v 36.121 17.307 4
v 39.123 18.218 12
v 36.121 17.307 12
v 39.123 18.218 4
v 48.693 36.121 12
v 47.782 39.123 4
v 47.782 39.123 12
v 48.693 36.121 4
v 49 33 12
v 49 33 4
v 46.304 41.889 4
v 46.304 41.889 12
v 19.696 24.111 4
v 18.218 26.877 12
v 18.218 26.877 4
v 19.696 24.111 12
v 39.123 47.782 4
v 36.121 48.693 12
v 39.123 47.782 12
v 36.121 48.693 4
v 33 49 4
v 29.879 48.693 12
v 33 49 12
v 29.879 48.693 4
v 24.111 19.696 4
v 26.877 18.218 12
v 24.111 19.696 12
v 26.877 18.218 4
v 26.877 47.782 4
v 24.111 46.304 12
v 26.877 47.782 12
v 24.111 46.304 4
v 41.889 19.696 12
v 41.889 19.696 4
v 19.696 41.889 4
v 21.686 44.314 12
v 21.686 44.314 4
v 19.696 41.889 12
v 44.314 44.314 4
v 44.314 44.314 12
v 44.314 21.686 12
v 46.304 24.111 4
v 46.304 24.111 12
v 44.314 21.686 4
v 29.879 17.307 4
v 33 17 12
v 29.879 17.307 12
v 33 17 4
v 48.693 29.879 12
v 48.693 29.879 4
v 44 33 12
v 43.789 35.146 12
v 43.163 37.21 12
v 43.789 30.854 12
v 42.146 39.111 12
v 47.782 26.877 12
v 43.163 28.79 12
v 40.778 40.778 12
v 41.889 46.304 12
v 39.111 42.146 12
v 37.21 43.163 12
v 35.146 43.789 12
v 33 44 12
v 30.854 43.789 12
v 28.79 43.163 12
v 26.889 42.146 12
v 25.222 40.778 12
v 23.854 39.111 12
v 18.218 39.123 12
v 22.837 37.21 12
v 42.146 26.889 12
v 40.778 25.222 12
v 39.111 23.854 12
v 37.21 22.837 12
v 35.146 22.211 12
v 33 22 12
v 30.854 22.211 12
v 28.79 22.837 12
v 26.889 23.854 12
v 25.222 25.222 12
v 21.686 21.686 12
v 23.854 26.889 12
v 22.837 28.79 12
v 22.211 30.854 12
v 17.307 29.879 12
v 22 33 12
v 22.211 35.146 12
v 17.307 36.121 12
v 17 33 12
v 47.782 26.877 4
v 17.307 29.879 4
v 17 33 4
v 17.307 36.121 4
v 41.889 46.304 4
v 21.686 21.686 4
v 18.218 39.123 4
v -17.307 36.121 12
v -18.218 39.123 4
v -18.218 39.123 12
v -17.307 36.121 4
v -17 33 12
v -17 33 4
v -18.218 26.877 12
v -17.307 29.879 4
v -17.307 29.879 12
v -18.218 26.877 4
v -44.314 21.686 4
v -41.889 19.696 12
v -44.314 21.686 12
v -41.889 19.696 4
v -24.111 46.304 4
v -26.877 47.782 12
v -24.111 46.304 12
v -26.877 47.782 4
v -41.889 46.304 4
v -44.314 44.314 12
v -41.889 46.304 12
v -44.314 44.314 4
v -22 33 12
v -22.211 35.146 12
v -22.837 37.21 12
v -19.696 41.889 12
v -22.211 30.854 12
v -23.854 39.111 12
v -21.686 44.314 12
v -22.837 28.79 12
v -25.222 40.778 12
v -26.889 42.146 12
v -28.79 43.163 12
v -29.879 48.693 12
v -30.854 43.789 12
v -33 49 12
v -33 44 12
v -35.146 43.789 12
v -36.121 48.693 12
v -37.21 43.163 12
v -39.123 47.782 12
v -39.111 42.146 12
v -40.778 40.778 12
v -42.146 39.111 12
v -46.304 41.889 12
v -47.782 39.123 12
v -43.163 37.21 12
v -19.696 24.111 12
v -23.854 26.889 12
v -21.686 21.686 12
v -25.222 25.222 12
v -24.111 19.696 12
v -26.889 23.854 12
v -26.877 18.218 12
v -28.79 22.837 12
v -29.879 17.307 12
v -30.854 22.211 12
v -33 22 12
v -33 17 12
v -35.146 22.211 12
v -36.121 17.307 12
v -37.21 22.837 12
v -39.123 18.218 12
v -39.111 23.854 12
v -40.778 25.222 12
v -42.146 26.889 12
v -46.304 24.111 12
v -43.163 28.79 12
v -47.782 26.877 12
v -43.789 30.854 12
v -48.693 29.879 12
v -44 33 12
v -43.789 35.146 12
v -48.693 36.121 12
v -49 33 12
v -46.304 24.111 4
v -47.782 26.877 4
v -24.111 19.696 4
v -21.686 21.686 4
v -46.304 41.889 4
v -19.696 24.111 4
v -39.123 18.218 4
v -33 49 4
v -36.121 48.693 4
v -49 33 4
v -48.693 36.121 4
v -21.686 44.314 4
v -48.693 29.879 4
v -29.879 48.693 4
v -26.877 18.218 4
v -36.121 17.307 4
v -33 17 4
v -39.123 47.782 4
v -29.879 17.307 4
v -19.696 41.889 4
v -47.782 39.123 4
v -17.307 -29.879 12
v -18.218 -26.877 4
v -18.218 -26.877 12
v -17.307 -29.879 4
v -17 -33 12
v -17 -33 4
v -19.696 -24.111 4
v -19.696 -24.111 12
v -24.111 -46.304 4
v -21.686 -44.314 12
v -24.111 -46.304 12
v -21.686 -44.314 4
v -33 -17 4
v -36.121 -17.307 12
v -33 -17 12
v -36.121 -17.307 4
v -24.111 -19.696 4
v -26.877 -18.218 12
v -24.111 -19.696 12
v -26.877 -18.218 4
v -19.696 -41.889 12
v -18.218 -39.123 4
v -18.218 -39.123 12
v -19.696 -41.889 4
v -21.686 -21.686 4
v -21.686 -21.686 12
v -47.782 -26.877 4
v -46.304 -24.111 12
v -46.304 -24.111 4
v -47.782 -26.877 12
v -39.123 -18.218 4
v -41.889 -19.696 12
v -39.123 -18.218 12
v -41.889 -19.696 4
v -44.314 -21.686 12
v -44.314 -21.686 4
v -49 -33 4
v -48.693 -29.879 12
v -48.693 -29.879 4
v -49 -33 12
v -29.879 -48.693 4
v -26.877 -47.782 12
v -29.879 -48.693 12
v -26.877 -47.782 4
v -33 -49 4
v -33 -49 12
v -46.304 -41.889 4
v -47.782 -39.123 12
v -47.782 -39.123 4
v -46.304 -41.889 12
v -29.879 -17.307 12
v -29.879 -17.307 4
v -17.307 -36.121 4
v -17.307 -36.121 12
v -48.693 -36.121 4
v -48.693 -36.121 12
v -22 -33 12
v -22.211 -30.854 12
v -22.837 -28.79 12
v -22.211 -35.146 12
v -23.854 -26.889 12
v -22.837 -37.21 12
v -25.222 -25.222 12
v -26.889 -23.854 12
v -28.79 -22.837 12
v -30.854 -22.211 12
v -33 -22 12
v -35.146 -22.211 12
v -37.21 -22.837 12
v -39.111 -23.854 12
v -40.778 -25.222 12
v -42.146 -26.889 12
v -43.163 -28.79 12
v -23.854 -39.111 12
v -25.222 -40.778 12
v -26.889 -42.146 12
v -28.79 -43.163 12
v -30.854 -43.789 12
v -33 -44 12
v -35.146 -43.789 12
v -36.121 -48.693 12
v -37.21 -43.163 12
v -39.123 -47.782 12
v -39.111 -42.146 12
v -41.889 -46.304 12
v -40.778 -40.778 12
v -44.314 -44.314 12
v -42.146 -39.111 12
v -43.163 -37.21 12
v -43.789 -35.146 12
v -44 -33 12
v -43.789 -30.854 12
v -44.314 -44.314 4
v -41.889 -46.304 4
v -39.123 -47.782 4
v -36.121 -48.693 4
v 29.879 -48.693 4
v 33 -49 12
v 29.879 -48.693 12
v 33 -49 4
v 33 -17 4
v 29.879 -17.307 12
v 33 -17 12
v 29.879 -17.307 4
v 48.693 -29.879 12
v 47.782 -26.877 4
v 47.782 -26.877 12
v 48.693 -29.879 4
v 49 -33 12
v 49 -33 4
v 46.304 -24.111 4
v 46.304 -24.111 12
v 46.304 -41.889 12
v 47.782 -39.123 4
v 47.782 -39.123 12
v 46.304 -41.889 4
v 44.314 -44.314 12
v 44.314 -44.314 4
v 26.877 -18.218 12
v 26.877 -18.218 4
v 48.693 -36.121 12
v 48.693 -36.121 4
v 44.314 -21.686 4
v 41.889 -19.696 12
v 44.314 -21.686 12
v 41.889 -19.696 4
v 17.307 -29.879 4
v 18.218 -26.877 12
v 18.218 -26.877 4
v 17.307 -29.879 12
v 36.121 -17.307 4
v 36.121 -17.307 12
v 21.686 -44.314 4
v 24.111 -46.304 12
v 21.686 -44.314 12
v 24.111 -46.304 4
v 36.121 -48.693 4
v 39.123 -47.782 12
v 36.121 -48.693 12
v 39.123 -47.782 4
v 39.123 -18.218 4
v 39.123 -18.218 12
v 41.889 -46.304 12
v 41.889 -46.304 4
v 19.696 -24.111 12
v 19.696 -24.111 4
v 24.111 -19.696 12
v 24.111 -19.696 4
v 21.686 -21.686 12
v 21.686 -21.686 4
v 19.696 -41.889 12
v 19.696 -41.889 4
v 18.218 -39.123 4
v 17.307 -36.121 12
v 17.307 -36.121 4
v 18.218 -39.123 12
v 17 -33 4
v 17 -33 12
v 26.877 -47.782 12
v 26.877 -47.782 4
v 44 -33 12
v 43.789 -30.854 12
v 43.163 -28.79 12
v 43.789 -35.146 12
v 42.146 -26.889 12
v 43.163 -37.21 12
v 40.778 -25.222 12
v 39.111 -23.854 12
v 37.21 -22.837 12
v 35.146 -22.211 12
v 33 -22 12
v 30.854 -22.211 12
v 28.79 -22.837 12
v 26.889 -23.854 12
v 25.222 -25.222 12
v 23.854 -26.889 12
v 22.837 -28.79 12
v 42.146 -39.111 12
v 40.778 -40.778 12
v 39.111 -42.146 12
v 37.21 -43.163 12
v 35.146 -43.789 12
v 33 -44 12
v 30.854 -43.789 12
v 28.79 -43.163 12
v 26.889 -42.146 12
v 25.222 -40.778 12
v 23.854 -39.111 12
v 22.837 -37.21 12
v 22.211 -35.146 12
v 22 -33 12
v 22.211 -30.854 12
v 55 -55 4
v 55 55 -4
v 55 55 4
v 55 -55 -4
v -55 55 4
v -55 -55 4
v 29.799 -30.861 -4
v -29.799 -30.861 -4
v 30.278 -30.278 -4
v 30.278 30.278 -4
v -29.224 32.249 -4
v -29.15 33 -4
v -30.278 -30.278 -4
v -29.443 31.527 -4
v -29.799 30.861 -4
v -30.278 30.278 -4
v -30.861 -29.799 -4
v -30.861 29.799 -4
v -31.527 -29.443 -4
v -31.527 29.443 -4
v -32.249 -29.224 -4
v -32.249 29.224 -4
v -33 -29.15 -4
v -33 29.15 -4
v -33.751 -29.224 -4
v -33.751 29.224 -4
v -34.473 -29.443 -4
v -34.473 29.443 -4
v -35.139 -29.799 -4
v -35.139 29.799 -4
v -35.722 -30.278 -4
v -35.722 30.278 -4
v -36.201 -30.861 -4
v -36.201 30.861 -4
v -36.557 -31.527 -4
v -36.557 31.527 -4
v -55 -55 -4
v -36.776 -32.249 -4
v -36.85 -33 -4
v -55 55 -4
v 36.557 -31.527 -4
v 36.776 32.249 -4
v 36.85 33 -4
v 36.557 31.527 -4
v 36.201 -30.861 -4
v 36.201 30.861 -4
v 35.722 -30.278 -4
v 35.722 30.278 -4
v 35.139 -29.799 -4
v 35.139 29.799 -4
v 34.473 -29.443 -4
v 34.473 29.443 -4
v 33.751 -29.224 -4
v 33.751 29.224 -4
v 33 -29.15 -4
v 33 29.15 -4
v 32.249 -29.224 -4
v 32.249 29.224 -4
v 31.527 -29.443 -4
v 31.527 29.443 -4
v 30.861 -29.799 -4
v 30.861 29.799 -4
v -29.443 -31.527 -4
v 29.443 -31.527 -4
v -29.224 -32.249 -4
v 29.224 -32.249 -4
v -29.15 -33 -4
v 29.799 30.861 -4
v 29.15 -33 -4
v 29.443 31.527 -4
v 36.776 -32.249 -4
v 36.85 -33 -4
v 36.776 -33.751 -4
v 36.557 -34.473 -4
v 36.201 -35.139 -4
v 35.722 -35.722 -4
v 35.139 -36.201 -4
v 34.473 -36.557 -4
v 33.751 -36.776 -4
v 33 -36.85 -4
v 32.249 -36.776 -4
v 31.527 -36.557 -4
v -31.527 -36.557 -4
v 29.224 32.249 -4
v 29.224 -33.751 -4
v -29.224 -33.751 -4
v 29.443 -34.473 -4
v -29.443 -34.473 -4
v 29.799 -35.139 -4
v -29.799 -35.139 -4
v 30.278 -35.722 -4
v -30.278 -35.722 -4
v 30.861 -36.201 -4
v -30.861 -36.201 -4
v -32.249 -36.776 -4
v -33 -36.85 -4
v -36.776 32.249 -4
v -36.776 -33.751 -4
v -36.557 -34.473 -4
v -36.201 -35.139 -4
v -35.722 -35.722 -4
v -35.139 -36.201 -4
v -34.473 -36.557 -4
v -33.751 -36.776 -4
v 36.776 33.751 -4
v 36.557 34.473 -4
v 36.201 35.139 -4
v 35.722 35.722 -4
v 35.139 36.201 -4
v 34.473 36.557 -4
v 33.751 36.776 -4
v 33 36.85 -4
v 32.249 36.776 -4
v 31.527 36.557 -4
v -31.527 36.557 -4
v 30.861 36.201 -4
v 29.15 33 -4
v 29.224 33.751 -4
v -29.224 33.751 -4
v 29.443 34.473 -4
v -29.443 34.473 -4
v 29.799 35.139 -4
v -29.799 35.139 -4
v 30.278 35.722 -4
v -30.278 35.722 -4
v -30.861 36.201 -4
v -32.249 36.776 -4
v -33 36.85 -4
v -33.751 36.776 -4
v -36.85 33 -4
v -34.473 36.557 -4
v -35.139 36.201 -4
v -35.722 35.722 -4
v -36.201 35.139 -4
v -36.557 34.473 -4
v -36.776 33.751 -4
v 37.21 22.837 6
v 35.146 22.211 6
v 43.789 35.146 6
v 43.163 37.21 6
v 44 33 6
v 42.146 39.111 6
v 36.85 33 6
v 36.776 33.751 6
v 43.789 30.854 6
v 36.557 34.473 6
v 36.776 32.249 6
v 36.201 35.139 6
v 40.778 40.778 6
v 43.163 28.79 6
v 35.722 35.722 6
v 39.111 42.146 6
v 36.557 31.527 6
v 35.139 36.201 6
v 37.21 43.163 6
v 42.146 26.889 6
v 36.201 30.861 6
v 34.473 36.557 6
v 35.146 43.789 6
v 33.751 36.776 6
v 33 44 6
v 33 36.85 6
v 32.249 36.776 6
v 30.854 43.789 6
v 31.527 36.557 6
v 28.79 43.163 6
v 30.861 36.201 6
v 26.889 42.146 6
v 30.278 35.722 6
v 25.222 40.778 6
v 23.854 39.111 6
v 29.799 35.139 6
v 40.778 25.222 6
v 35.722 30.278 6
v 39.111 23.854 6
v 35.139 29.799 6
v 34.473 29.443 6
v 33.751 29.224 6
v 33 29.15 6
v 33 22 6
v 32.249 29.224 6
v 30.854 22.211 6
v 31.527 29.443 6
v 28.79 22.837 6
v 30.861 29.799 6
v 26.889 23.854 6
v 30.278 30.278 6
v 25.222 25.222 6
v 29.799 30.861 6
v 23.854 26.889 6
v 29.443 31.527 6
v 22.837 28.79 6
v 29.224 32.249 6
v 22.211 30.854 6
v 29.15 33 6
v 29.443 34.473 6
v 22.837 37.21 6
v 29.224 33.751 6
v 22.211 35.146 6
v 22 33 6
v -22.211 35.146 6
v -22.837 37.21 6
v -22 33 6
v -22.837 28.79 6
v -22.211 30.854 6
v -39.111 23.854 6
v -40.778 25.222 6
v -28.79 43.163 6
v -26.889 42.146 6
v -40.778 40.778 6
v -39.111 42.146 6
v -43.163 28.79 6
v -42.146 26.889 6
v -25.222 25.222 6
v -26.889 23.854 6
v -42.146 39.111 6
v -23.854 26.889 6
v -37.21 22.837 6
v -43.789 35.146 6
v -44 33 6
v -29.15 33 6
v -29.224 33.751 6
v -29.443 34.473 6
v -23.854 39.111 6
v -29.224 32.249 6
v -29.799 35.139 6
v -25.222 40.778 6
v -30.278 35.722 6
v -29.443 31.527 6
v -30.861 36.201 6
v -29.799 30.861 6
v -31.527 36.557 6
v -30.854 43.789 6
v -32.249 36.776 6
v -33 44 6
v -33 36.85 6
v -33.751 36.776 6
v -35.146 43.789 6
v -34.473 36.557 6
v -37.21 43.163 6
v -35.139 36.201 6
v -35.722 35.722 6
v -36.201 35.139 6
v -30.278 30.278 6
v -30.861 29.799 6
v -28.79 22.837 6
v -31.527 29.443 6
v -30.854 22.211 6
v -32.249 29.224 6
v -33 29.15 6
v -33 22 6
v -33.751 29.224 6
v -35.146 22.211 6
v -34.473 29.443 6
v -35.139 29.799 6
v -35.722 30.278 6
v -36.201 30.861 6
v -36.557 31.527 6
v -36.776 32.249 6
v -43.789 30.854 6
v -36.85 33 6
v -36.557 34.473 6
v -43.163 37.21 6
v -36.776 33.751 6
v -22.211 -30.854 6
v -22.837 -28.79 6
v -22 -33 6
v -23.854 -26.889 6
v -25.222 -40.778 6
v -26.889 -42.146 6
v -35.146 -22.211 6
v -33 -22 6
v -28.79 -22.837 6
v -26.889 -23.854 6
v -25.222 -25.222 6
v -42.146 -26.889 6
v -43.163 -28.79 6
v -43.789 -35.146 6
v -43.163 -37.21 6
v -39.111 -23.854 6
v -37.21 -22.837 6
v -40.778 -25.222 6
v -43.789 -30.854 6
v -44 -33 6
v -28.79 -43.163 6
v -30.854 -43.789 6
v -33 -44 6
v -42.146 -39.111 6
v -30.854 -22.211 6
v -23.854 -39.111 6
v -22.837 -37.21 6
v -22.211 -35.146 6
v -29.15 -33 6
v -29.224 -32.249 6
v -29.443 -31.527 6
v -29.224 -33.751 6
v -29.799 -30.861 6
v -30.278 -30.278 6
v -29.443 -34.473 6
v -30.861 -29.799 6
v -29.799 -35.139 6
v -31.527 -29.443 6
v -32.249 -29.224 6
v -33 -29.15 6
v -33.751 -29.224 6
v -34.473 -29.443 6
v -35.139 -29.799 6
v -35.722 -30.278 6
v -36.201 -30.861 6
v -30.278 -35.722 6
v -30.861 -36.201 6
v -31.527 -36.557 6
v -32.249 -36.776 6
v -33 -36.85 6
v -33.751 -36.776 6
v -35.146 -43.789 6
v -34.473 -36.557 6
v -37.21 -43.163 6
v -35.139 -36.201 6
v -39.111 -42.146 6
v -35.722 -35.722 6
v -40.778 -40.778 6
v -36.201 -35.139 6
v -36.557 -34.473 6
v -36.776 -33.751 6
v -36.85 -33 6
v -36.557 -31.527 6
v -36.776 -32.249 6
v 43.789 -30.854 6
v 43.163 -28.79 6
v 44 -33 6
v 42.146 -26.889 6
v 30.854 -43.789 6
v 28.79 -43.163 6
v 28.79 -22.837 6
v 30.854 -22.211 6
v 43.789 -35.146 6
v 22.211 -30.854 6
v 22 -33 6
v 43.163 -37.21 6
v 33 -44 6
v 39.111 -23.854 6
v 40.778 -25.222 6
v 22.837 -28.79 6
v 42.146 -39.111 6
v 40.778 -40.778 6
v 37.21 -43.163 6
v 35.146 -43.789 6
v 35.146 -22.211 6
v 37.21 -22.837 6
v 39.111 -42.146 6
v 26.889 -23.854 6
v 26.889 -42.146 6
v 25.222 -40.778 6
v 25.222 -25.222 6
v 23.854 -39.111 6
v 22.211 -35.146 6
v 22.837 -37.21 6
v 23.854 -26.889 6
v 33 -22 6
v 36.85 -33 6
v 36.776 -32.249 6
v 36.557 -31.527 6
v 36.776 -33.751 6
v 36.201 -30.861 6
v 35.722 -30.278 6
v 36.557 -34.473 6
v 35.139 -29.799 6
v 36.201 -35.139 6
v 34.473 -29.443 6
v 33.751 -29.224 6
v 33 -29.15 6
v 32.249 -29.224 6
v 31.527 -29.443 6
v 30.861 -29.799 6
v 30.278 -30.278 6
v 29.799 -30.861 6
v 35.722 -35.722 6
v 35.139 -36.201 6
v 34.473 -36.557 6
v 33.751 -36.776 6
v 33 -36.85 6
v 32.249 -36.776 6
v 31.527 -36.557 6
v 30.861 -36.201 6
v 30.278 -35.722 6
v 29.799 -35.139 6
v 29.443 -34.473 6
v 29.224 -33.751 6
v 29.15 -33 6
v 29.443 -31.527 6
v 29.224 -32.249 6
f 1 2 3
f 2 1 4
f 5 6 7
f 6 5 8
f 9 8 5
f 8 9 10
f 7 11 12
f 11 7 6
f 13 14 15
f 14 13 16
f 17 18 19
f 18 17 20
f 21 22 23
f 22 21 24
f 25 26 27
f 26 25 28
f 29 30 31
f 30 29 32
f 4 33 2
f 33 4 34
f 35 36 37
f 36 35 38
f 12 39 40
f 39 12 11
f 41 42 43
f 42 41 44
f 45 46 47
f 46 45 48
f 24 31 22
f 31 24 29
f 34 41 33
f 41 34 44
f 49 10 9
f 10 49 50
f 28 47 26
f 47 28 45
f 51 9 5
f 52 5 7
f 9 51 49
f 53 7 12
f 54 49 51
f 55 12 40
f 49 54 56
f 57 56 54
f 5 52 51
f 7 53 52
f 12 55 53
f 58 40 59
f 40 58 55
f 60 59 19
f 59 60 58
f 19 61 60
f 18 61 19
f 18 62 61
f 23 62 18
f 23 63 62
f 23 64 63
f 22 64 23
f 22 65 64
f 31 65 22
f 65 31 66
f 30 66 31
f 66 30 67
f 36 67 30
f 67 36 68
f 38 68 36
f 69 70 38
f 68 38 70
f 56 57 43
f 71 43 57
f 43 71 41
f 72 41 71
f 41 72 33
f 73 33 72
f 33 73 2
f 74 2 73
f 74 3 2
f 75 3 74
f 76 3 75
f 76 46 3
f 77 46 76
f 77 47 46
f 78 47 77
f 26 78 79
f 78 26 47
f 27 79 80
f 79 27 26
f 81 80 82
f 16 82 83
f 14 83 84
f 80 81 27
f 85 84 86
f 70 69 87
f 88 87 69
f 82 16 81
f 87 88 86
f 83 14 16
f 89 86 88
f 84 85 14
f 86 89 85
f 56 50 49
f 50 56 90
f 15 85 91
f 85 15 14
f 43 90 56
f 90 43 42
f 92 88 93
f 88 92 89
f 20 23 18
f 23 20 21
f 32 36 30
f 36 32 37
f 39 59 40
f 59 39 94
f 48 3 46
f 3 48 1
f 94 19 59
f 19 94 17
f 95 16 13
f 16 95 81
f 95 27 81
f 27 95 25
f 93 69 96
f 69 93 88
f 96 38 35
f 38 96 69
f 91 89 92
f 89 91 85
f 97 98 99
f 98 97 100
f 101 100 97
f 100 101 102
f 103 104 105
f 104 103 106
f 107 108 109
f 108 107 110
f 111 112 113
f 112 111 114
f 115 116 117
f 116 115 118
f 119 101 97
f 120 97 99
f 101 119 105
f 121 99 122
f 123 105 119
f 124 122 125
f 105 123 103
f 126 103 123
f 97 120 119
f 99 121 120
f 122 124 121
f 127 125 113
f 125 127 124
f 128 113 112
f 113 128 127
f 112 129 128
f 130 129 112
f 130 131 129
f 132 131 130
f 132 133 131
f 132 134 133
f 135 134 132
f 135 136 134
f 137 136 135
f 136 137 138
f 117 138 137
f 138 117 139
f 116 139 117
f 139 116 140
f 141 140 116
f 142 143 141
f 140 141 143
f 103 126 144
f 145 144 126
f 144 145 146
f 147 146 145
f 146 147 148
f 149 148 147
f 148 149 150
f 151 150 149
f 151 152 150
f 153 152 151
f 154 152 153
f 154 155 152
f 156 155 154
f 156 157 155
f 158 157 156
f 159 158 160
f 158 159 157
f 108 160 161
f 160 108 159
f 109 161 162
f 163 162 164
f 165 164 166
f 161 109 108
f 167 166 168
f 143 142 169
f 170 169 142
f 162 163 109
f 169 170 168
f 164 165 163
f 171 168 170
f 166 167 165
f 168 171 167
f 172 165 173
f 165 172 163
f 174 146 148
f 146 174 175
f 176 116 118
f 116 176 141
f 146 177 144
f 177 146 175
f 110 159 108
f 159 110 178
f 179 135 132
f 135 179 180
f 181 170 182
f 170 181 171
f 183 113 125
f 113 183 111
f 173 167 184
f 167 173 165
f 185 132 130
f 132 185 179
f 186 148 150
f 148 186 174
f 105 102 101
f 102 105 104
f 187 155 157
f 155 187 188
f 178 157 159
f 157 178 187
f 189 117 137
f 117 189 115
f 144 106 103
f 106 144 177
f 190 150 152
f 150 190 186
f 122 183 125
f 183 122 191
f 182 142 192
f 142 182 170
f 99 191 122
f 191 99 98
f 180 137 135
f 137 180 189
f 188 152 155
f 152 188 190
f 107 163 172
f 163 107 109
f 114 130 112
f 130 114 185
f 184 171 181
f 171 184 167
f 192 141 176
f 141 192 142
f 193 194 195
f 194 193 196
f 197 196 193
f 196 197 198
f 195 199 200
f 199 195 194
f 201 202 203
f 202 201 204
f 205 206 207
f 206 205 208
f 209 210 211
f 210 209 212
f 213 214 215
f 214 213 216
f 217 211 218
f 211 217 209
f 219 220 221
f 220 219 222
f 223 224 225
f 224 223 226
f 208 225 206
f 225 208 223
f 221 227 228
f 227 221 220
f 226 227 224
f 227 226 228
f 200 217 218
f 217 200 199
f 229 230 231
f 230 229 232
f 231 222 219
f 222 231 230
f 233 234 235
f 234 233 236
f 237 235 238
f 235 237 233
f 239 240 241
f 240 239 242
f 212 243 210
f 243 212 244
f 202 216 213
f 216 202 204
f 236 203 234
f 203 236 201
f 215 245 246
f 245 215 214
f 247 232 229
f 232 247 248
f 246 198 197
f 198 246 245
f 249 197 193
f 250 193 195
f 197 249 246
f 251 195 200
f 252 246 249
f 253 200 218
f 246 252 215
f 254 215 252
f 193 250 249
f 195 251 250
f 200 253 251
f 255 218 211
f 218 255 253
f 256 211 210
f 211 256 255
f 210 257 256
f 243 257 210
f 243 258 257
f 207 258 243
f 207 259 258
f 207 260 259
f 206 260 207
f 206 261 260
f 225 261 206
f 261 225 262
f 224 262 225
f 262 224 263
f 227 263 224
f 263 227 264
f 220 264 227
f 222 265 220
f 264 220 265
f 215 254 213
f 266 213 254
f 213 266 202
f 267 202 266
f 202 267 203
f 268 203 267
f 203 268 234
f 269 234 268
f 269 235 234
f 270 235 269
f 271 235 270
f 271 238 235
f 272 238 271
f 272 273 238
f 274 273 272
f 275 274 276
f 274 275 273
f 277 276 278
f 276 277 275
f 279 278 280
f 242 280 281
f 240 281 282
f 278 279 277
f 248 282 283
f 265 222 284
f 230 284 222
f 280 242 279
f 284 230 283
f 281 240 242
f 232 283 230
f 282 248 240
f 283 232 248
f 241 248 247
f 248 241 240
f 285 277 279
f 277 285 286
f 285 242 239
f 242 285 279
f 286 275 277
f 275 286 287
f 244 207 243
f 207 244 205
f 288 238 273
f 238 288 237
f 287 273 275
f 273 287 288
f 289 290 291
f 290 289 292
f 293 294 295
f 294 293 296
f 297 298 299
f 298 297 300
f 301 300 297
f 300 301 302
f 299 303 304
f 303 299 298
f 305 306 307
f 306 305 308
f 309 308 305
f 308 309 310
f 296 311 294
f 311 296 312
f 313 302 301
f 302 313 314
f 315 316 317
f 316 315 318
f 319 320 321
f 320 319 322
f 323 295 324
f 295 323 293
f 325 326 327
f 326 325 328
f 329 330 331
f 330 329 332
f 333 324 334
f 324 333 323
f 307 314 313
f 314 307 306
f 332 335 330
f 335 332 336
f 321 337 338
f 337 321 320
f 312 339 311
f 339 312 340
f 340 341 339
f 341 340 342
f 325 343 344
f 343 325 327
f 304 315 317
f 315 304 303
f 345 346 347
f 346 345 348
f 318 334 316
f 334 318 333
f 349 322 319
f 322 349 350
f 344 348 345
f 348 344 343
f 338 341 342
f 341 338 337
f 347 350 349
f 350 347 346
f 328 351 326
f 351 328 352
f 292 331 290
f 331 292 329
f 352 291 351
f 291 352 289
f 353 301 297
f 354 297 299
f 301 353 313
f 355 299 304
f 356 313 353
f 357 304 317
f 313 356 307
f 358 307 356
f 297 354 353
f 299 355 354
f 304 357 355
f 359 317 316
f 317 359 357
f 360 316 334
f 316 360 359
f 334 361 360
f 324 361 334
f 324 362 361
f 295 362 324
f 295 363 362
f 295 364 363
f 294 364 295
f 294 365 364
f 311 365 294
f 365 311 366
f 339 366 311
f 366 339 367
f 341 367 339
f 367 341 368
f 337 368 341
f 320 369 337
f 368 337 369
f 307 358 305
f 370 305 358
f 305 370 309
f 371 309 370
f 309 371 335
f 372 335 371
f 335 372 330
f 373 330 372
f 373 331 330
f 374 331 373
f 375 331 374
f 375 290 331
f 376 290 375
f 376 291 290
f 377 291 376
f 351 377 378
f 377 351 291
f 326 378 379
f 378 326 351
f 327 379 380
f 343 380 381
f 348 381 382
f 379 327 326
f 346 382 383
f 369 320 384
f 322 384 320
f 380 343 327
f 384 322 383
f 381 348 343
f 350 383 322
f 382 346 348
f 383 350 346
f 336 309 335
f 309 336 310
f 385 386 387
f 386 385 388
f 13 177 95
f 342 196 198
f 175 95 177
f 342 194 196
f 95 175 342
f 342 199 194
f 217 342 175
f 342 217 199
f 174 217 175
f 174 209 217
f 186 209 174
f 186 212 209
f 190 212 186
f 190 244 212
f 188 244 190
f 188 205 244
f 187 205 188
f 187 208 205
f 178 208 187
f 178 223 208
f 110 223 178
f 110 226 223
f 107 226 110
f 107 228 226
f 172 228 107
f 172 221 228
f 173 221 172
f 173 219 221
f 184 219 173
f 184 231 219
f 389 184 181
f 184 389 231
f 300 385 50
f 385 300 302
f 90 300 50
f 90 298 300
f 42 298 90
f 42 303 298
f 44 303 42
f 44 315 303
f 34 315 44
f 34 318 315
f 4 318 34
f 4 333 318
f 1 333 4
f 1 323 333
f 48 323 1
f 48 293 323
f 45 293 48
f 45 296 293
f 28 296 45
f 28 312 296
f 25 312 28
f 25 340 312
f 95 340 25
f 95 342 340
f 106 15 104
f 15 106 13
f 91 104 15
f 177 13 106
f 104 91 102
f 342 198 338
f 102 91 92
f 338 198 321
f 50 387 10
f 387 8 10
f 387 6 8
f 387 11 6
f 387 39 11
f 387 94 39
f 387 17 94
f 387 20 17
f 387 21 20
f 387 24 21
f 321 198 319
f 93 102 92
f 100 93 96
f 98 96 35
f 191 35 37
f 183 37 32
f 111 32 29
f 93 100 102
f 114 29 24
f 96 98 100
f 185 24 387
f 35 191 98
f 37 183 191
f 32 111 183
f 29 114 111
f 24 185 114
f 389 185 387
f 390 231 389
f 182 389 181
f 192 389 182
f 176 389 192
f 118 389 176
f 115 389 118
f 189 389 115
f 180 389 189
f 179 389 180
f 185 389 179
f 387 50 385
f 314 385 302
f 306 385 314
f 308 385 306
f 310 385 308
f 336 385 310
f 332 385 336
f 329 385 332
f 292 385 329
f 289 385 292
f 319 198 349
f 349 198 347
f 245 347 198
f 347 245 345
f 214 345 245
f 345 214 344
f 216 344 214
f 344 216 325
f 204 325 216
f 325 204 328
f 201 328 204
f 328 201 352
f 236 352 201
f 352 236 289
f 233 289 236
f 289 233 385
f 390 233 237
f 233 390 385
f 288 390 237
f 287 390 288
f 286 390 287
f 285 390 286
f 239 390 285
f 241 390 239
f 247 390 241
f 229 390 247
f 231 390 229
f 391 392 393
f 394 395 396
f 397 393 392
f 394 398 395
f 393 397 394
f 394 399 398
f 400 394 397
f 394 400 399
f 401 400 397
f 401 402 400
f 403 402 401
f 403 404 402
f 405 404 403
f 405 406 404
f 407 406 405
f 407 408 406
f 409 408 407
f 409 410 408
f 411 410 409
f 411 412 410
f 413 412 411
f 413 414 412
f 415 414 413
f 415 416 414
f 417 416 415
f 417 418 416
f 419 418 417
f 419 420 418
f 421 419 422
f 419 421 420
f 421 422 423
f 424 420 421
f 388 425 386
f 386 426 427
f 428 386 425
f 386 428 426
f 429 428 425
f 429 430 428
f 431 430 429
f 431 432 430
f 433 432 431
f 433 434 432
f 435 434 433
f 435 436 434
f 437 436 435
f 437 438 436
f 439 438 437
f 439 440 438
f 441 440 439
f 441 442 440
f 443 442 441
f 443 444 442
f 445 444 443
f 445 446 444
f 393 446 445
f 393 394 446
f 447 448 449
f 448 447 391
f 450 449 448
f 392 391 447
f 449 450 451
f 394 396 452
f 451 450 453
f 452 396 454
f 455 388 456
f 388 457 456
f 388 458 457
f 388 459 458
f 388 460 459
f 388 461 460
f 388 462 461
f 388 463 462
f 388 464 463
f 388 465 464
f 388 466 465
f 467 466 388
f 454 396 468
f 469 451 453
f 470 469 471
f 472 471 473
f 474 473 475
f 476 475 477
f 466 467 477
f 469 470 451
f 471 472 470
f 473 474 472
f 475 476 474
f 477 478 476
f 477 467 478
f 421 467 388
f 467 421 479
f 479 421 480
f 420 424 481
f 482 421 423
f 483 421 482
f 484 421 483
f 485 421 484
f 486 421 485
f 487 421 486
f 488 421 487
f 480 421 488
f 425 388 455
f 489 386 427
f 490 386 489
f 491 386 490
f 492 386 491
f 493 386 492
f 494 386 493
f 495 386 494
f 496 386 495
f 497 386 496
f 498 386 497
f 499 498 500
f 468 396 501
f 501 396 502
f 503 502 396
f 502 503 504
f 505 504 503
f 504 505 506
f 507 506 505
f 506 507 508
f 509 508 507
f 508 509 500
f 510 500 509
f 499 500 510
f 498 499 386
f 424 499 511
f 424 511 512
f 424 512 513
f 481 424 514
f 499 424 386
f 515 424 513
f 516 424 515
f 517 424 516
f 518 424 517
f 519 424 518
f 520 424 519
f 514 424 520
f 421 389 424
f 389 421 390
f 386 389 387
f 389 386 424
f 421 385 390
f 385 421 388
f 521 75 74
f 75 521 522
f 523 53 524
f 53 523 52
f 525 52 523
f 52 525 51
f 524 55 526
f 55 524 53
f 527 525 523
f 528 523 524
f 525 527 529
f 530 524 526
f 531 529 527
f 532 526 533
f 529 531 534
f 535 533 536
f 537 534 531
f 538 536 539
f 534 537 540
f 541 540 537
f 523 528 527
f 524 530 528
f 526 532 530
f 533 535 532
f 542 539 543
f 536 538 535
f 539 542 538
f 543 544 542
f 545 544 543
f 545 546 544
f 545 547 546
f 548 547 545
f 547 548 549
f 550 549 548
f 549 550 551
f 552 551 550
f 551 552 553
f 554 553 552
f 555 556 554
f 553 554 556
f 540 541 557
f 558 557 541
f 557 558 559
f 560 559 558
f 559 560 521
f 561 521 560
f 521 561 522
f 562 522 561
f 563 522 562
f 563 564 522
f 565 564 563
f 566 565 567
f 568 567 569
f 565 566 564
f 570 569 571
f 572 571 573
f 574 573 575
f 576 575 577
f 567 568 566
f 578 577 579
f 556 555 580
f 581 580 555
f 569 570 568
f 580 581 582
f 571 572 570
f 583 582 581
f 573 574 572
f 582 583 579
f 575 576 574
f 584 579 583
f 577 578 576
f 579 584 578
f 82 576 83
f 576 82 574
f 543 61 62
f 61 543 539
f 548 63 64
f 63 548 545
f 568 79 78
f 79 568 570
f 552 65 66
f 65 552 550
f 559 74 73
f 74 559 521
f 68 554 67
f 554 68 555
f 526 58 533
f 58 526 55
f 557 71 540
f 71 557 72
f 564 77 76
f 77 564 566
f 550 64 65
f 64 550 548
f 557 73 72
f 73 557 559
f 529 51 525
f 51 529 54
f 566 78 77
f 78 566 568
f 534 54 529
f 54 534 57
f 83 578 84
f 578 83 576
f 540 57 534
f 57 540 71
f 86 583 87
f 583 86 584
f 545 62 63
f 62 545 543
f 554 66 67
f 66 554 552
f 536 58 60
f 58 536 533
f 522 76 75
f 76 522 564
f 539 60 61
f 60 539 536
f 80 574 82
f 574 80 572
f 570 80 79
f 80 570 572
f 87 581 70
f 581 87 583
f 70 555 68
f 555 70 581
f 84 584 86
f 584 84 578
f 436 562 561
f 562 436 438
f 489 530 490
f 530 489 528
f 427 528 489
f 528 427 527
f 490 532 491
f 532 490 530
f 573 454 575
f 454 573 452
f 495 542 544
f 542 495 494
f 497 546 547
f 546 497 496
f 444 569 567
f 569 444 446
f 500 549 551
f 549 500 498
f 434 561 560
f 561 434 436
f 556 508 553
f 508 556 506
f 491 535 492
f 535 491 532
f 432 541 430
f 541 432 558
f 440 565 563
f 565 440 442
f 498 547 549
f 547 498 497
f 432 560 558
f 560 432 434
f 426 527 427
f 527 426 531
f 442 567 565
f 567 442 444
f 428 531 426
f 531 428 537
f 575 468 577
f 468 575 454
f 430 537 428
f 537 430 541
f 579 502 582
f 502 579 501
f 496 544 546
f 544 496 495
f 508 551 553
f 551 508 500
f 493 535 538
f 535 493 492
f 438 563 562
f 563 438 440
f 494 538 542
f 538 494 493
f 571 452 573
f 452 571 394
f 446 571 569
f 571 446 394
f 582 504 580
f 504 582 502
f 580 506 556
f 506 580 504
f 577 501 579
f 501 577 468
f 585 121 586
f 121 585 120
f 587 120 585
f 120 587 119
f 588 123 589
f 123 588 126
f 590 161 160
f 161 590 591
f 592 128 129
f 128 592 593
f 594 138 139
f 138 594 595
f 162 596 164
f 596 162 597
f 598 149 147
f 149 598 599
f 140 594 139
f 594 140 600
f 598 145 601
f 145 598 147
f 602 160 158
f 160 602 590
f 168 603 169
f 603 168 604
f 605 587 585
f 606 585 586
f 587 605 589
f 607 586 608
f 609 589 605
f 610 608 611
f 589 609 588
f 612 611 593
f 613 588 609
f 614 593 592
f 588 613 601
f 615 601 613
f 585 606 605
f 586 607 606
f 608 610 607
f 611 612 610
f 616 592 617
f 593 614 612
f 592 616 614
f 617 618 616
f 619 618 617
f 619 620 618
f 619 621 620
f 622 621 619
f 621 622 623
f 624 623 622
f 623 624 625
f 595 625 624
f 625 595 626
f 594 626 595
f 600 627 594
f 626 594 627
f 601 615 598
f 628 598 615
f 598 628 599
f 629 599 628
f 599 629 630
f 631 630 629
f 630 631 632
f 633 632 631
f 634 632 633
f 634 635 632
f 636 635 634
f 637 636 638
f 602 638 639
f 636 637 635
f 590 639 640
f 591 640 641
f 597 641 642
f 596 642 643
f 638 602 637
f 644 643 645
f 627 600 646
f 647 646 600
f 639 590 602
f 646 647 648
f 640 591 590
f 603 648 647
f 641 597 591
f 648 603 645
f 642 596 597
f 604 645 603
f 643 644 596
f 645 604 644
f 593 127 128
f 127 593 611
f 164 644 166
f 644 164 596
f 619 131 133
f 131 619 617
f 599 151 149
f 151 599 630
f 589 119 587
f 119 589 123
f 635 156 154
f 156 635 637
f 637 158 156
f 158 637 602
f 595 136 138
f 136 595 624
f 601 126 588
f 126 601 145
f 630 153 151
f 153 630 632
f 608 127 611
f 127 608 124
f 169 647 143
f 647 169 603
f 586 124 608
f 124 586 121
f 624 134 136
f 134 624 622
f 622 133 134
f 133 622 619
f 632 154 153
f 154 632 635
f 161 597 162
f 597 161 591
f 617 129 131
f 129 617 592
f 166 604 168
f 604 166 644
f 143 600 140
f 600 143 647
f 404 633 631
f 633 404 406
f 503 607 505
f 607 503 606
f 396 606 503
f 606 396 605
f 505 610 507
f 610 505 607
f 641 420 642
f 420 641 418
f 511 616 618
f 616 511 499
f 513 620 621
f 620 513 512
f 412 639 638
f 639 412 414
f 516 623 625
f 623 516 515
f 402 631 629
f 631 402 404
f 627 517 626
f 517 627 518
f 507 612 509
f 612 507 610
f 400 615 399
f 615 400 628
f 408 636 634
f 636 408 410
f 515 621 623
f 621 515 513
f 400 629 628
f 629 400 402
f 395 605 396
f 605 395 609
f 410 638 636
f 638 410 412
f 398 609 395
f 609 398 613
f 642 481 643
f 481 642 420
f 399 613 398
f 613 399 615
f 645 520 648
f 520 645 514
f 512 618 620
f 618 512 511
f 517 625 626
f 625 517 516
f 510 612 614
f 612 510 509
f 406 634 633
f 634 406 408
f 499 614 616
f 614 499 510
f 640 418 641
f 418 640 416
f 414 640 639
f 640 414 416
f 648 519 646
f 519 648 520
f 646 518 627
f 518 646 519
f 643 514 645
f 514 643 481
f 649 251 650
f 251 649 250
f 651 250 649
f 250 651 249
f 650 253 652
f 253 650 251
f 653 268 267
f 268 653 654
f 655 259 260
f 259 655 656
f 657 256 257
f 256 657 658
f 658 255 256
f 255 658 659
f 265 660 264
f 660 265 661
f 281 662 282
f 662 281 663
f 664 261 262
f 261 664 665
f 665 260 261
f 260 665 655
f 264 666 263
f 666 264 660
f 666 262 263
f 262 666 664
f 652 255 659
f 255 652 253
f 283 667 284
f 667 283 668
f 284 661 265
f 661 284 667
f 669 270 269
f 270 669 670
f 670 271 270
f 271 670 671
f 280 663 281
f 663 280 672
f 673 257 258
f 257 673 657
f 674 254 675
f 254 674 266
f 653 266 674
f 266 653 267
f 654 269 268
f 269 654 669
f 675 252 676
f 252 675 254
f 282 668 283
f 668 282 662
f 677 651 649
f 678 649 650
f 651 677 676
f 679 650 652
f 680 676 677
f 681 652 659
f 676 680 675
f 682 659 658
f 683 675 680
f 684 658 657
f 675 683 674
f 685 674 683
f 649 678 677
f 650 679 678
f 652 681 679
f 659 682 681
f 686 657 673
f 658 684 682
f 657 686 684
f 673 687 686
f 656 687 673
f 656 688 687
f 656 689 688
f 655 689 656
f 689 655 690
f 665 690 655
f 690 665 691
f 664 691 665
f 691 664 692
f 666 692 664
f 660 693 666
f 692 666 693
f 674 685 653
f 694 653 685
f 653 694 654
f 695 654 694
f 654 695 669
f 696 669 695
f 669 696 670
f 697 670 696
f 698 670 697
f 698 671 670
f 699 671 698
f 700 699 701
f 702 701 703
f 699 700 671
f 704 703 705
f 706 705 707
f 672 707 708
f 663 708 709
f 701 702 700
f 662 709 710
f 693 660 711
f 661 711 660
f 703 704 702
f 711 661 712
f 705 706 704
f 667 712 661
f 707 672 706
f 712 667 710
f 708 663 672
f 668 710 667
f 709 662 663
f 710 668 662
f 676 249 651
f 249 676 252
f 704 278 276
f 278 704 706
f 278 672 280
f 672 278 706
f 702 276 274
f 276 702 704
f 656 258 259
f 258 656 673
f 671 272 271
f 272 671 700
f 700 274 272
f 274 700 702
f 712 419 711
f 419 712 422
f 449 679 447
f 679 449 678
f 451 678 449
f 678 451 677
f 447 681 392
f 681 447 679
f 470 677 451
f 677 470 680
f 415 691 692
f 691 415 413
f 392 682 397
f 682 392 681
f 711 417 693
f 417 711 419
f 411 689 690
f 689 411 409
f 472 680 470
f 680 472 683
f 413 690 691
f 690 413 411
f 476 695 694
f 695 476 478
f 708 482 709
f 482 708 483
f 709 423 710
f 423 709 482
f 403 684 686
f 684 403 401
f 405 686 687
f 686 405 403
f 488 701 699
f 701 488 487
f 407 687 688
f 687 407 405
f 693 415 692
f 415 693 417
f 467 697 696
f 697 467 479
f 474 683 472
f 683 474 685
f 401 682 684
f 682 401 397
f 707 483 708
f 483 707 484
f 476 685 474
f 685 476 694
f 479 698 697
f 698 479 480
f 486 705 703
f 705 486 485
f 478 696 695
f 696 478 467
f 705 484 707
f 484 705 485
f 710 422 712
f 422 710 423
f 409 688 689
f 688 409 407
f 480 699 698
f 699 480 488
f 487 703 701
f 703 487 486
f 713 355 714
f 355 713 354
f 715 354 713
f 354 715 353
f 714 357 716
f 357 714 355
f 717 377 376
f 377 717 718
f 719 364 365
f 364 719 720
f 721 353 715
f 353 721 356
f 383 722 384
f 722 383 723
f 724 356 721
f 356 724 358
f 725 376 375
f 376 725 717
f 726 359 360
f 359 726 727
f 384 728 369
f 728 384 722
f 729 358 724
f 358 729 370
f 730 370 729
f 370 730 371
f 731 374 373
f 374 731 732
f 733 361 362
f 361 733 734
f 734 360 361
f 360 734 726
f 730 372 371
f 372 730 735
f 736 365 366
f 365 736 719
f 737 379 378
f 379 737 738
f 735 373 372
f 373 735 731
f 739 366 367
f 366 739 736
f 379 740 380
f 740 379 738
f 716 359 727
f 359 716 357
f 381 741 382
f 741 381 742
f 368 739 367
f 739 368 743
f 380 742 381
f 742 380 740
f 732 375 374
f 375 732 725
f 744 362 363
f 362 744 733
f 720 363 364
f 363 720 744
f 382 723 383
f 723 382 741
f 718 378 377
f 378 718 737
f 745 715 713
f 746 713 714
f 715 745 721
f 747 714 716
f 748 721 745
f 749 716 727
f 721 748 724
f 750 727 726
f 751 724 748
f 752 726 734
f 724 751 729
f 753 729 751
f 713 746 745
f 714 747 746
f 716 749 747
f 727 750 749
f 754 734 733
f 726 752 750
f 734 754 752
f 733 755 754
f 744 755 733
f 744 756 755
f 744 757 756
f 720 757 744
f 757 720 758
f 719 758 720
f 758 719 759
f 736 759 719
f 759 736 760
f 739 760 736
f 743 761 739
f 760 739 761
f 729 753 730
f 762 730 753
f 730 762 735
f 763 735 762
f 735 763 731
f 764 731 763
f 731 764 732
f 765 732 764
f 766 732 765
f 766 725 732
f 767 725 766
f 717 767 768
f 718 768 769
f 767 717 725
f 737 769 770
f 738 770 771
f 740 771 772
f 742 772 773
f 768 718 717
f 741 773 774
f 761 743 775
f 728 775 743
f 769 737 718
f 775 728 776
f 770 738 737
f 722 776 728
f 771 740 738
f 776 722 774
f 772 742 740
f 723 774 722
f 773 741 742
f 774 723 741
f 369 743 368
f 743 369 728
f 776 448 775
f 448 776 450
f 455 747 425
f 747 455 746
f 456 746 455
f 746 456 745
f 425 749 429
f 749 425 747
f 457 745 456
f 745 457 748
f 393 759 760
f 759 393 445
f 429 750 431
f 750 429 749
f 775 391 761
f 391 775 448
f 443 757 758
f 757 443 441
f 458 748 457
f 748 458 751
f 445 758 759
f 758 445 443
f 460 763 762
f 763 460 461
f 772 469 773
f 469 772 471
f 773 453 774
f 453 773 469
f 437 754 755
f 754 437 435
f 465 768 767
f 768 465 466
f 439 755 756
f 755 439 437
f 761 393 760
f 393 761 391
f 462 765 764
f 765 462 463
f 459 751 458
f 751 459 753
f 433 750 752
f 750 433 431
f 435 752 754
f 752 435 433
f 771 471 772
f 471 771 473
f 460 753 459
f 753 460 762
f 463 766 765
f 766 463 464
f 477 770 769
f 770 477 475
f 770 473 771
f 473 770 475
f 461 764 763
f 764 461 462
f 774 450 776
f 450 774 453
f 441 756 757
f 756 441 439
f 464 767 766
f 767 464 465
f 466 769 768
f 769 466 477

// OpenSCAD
$fn = 32;

// ----------------------------------------------------------------------
// Socket pad plate
// bosses with counterbored sockets for the screws
// ----------------------------------------------------------------------

// --- parameters (mm) ---
base_t = 8;             // base plate thickness
boss_h = 8;             // boss height above the base plate
boss_d = 32;            // boss diameter
socket_d = 22;          // socket diameter
socket_depth = 6;       // socket depth from the boss face
bolt_d = 7.7;           // screw clearance hole through the socket floor
plate = [110, 110, 8];  // overall size (x, y, z)
edge = 22;              // boss centre offset from the plate edge
pads = 4;               // boss count, one per corner

// --- derived feature positions (mm) ---
height = base_t + boss_h;        // = 16   overall height of the part
corner_x = plate[0] / 2 - edge;  // = 33   boss centre X
corner_y = plate[1] / 2 - edge;  // = 33   boss centre Y
feature_centers = [
  [corner_x, corner_y],
  [-corner_x, corner_y],
  [-corner_x, -corner_y],
  [corner_x, -corner_y]
];   // boss centres: sockets, holes and the pads themselves are placed from here

// base plate, bosses on feature_centers, socket + through hole in each
difference() {
  union() {
    cube(plate, center = true);
    for (centre = feature_centers)
      translate([centre[0], centre[1], plate[2] / 2 - 1])
        cylinder(d = boss_d, h = boss_h + 1);
  }
  for (centre = feature_centers) {
    translate([centre[0], centre[1], plate[2] / 2 + boss_h - socket_depth])
      cylinder(d = socket_d, h = socket_depth + 1);
    translate([centre[0], centre[1], -height])
      cylinder(d = bolt_d, h = 2 * height + 2);  // through the socket floor
  }
}
